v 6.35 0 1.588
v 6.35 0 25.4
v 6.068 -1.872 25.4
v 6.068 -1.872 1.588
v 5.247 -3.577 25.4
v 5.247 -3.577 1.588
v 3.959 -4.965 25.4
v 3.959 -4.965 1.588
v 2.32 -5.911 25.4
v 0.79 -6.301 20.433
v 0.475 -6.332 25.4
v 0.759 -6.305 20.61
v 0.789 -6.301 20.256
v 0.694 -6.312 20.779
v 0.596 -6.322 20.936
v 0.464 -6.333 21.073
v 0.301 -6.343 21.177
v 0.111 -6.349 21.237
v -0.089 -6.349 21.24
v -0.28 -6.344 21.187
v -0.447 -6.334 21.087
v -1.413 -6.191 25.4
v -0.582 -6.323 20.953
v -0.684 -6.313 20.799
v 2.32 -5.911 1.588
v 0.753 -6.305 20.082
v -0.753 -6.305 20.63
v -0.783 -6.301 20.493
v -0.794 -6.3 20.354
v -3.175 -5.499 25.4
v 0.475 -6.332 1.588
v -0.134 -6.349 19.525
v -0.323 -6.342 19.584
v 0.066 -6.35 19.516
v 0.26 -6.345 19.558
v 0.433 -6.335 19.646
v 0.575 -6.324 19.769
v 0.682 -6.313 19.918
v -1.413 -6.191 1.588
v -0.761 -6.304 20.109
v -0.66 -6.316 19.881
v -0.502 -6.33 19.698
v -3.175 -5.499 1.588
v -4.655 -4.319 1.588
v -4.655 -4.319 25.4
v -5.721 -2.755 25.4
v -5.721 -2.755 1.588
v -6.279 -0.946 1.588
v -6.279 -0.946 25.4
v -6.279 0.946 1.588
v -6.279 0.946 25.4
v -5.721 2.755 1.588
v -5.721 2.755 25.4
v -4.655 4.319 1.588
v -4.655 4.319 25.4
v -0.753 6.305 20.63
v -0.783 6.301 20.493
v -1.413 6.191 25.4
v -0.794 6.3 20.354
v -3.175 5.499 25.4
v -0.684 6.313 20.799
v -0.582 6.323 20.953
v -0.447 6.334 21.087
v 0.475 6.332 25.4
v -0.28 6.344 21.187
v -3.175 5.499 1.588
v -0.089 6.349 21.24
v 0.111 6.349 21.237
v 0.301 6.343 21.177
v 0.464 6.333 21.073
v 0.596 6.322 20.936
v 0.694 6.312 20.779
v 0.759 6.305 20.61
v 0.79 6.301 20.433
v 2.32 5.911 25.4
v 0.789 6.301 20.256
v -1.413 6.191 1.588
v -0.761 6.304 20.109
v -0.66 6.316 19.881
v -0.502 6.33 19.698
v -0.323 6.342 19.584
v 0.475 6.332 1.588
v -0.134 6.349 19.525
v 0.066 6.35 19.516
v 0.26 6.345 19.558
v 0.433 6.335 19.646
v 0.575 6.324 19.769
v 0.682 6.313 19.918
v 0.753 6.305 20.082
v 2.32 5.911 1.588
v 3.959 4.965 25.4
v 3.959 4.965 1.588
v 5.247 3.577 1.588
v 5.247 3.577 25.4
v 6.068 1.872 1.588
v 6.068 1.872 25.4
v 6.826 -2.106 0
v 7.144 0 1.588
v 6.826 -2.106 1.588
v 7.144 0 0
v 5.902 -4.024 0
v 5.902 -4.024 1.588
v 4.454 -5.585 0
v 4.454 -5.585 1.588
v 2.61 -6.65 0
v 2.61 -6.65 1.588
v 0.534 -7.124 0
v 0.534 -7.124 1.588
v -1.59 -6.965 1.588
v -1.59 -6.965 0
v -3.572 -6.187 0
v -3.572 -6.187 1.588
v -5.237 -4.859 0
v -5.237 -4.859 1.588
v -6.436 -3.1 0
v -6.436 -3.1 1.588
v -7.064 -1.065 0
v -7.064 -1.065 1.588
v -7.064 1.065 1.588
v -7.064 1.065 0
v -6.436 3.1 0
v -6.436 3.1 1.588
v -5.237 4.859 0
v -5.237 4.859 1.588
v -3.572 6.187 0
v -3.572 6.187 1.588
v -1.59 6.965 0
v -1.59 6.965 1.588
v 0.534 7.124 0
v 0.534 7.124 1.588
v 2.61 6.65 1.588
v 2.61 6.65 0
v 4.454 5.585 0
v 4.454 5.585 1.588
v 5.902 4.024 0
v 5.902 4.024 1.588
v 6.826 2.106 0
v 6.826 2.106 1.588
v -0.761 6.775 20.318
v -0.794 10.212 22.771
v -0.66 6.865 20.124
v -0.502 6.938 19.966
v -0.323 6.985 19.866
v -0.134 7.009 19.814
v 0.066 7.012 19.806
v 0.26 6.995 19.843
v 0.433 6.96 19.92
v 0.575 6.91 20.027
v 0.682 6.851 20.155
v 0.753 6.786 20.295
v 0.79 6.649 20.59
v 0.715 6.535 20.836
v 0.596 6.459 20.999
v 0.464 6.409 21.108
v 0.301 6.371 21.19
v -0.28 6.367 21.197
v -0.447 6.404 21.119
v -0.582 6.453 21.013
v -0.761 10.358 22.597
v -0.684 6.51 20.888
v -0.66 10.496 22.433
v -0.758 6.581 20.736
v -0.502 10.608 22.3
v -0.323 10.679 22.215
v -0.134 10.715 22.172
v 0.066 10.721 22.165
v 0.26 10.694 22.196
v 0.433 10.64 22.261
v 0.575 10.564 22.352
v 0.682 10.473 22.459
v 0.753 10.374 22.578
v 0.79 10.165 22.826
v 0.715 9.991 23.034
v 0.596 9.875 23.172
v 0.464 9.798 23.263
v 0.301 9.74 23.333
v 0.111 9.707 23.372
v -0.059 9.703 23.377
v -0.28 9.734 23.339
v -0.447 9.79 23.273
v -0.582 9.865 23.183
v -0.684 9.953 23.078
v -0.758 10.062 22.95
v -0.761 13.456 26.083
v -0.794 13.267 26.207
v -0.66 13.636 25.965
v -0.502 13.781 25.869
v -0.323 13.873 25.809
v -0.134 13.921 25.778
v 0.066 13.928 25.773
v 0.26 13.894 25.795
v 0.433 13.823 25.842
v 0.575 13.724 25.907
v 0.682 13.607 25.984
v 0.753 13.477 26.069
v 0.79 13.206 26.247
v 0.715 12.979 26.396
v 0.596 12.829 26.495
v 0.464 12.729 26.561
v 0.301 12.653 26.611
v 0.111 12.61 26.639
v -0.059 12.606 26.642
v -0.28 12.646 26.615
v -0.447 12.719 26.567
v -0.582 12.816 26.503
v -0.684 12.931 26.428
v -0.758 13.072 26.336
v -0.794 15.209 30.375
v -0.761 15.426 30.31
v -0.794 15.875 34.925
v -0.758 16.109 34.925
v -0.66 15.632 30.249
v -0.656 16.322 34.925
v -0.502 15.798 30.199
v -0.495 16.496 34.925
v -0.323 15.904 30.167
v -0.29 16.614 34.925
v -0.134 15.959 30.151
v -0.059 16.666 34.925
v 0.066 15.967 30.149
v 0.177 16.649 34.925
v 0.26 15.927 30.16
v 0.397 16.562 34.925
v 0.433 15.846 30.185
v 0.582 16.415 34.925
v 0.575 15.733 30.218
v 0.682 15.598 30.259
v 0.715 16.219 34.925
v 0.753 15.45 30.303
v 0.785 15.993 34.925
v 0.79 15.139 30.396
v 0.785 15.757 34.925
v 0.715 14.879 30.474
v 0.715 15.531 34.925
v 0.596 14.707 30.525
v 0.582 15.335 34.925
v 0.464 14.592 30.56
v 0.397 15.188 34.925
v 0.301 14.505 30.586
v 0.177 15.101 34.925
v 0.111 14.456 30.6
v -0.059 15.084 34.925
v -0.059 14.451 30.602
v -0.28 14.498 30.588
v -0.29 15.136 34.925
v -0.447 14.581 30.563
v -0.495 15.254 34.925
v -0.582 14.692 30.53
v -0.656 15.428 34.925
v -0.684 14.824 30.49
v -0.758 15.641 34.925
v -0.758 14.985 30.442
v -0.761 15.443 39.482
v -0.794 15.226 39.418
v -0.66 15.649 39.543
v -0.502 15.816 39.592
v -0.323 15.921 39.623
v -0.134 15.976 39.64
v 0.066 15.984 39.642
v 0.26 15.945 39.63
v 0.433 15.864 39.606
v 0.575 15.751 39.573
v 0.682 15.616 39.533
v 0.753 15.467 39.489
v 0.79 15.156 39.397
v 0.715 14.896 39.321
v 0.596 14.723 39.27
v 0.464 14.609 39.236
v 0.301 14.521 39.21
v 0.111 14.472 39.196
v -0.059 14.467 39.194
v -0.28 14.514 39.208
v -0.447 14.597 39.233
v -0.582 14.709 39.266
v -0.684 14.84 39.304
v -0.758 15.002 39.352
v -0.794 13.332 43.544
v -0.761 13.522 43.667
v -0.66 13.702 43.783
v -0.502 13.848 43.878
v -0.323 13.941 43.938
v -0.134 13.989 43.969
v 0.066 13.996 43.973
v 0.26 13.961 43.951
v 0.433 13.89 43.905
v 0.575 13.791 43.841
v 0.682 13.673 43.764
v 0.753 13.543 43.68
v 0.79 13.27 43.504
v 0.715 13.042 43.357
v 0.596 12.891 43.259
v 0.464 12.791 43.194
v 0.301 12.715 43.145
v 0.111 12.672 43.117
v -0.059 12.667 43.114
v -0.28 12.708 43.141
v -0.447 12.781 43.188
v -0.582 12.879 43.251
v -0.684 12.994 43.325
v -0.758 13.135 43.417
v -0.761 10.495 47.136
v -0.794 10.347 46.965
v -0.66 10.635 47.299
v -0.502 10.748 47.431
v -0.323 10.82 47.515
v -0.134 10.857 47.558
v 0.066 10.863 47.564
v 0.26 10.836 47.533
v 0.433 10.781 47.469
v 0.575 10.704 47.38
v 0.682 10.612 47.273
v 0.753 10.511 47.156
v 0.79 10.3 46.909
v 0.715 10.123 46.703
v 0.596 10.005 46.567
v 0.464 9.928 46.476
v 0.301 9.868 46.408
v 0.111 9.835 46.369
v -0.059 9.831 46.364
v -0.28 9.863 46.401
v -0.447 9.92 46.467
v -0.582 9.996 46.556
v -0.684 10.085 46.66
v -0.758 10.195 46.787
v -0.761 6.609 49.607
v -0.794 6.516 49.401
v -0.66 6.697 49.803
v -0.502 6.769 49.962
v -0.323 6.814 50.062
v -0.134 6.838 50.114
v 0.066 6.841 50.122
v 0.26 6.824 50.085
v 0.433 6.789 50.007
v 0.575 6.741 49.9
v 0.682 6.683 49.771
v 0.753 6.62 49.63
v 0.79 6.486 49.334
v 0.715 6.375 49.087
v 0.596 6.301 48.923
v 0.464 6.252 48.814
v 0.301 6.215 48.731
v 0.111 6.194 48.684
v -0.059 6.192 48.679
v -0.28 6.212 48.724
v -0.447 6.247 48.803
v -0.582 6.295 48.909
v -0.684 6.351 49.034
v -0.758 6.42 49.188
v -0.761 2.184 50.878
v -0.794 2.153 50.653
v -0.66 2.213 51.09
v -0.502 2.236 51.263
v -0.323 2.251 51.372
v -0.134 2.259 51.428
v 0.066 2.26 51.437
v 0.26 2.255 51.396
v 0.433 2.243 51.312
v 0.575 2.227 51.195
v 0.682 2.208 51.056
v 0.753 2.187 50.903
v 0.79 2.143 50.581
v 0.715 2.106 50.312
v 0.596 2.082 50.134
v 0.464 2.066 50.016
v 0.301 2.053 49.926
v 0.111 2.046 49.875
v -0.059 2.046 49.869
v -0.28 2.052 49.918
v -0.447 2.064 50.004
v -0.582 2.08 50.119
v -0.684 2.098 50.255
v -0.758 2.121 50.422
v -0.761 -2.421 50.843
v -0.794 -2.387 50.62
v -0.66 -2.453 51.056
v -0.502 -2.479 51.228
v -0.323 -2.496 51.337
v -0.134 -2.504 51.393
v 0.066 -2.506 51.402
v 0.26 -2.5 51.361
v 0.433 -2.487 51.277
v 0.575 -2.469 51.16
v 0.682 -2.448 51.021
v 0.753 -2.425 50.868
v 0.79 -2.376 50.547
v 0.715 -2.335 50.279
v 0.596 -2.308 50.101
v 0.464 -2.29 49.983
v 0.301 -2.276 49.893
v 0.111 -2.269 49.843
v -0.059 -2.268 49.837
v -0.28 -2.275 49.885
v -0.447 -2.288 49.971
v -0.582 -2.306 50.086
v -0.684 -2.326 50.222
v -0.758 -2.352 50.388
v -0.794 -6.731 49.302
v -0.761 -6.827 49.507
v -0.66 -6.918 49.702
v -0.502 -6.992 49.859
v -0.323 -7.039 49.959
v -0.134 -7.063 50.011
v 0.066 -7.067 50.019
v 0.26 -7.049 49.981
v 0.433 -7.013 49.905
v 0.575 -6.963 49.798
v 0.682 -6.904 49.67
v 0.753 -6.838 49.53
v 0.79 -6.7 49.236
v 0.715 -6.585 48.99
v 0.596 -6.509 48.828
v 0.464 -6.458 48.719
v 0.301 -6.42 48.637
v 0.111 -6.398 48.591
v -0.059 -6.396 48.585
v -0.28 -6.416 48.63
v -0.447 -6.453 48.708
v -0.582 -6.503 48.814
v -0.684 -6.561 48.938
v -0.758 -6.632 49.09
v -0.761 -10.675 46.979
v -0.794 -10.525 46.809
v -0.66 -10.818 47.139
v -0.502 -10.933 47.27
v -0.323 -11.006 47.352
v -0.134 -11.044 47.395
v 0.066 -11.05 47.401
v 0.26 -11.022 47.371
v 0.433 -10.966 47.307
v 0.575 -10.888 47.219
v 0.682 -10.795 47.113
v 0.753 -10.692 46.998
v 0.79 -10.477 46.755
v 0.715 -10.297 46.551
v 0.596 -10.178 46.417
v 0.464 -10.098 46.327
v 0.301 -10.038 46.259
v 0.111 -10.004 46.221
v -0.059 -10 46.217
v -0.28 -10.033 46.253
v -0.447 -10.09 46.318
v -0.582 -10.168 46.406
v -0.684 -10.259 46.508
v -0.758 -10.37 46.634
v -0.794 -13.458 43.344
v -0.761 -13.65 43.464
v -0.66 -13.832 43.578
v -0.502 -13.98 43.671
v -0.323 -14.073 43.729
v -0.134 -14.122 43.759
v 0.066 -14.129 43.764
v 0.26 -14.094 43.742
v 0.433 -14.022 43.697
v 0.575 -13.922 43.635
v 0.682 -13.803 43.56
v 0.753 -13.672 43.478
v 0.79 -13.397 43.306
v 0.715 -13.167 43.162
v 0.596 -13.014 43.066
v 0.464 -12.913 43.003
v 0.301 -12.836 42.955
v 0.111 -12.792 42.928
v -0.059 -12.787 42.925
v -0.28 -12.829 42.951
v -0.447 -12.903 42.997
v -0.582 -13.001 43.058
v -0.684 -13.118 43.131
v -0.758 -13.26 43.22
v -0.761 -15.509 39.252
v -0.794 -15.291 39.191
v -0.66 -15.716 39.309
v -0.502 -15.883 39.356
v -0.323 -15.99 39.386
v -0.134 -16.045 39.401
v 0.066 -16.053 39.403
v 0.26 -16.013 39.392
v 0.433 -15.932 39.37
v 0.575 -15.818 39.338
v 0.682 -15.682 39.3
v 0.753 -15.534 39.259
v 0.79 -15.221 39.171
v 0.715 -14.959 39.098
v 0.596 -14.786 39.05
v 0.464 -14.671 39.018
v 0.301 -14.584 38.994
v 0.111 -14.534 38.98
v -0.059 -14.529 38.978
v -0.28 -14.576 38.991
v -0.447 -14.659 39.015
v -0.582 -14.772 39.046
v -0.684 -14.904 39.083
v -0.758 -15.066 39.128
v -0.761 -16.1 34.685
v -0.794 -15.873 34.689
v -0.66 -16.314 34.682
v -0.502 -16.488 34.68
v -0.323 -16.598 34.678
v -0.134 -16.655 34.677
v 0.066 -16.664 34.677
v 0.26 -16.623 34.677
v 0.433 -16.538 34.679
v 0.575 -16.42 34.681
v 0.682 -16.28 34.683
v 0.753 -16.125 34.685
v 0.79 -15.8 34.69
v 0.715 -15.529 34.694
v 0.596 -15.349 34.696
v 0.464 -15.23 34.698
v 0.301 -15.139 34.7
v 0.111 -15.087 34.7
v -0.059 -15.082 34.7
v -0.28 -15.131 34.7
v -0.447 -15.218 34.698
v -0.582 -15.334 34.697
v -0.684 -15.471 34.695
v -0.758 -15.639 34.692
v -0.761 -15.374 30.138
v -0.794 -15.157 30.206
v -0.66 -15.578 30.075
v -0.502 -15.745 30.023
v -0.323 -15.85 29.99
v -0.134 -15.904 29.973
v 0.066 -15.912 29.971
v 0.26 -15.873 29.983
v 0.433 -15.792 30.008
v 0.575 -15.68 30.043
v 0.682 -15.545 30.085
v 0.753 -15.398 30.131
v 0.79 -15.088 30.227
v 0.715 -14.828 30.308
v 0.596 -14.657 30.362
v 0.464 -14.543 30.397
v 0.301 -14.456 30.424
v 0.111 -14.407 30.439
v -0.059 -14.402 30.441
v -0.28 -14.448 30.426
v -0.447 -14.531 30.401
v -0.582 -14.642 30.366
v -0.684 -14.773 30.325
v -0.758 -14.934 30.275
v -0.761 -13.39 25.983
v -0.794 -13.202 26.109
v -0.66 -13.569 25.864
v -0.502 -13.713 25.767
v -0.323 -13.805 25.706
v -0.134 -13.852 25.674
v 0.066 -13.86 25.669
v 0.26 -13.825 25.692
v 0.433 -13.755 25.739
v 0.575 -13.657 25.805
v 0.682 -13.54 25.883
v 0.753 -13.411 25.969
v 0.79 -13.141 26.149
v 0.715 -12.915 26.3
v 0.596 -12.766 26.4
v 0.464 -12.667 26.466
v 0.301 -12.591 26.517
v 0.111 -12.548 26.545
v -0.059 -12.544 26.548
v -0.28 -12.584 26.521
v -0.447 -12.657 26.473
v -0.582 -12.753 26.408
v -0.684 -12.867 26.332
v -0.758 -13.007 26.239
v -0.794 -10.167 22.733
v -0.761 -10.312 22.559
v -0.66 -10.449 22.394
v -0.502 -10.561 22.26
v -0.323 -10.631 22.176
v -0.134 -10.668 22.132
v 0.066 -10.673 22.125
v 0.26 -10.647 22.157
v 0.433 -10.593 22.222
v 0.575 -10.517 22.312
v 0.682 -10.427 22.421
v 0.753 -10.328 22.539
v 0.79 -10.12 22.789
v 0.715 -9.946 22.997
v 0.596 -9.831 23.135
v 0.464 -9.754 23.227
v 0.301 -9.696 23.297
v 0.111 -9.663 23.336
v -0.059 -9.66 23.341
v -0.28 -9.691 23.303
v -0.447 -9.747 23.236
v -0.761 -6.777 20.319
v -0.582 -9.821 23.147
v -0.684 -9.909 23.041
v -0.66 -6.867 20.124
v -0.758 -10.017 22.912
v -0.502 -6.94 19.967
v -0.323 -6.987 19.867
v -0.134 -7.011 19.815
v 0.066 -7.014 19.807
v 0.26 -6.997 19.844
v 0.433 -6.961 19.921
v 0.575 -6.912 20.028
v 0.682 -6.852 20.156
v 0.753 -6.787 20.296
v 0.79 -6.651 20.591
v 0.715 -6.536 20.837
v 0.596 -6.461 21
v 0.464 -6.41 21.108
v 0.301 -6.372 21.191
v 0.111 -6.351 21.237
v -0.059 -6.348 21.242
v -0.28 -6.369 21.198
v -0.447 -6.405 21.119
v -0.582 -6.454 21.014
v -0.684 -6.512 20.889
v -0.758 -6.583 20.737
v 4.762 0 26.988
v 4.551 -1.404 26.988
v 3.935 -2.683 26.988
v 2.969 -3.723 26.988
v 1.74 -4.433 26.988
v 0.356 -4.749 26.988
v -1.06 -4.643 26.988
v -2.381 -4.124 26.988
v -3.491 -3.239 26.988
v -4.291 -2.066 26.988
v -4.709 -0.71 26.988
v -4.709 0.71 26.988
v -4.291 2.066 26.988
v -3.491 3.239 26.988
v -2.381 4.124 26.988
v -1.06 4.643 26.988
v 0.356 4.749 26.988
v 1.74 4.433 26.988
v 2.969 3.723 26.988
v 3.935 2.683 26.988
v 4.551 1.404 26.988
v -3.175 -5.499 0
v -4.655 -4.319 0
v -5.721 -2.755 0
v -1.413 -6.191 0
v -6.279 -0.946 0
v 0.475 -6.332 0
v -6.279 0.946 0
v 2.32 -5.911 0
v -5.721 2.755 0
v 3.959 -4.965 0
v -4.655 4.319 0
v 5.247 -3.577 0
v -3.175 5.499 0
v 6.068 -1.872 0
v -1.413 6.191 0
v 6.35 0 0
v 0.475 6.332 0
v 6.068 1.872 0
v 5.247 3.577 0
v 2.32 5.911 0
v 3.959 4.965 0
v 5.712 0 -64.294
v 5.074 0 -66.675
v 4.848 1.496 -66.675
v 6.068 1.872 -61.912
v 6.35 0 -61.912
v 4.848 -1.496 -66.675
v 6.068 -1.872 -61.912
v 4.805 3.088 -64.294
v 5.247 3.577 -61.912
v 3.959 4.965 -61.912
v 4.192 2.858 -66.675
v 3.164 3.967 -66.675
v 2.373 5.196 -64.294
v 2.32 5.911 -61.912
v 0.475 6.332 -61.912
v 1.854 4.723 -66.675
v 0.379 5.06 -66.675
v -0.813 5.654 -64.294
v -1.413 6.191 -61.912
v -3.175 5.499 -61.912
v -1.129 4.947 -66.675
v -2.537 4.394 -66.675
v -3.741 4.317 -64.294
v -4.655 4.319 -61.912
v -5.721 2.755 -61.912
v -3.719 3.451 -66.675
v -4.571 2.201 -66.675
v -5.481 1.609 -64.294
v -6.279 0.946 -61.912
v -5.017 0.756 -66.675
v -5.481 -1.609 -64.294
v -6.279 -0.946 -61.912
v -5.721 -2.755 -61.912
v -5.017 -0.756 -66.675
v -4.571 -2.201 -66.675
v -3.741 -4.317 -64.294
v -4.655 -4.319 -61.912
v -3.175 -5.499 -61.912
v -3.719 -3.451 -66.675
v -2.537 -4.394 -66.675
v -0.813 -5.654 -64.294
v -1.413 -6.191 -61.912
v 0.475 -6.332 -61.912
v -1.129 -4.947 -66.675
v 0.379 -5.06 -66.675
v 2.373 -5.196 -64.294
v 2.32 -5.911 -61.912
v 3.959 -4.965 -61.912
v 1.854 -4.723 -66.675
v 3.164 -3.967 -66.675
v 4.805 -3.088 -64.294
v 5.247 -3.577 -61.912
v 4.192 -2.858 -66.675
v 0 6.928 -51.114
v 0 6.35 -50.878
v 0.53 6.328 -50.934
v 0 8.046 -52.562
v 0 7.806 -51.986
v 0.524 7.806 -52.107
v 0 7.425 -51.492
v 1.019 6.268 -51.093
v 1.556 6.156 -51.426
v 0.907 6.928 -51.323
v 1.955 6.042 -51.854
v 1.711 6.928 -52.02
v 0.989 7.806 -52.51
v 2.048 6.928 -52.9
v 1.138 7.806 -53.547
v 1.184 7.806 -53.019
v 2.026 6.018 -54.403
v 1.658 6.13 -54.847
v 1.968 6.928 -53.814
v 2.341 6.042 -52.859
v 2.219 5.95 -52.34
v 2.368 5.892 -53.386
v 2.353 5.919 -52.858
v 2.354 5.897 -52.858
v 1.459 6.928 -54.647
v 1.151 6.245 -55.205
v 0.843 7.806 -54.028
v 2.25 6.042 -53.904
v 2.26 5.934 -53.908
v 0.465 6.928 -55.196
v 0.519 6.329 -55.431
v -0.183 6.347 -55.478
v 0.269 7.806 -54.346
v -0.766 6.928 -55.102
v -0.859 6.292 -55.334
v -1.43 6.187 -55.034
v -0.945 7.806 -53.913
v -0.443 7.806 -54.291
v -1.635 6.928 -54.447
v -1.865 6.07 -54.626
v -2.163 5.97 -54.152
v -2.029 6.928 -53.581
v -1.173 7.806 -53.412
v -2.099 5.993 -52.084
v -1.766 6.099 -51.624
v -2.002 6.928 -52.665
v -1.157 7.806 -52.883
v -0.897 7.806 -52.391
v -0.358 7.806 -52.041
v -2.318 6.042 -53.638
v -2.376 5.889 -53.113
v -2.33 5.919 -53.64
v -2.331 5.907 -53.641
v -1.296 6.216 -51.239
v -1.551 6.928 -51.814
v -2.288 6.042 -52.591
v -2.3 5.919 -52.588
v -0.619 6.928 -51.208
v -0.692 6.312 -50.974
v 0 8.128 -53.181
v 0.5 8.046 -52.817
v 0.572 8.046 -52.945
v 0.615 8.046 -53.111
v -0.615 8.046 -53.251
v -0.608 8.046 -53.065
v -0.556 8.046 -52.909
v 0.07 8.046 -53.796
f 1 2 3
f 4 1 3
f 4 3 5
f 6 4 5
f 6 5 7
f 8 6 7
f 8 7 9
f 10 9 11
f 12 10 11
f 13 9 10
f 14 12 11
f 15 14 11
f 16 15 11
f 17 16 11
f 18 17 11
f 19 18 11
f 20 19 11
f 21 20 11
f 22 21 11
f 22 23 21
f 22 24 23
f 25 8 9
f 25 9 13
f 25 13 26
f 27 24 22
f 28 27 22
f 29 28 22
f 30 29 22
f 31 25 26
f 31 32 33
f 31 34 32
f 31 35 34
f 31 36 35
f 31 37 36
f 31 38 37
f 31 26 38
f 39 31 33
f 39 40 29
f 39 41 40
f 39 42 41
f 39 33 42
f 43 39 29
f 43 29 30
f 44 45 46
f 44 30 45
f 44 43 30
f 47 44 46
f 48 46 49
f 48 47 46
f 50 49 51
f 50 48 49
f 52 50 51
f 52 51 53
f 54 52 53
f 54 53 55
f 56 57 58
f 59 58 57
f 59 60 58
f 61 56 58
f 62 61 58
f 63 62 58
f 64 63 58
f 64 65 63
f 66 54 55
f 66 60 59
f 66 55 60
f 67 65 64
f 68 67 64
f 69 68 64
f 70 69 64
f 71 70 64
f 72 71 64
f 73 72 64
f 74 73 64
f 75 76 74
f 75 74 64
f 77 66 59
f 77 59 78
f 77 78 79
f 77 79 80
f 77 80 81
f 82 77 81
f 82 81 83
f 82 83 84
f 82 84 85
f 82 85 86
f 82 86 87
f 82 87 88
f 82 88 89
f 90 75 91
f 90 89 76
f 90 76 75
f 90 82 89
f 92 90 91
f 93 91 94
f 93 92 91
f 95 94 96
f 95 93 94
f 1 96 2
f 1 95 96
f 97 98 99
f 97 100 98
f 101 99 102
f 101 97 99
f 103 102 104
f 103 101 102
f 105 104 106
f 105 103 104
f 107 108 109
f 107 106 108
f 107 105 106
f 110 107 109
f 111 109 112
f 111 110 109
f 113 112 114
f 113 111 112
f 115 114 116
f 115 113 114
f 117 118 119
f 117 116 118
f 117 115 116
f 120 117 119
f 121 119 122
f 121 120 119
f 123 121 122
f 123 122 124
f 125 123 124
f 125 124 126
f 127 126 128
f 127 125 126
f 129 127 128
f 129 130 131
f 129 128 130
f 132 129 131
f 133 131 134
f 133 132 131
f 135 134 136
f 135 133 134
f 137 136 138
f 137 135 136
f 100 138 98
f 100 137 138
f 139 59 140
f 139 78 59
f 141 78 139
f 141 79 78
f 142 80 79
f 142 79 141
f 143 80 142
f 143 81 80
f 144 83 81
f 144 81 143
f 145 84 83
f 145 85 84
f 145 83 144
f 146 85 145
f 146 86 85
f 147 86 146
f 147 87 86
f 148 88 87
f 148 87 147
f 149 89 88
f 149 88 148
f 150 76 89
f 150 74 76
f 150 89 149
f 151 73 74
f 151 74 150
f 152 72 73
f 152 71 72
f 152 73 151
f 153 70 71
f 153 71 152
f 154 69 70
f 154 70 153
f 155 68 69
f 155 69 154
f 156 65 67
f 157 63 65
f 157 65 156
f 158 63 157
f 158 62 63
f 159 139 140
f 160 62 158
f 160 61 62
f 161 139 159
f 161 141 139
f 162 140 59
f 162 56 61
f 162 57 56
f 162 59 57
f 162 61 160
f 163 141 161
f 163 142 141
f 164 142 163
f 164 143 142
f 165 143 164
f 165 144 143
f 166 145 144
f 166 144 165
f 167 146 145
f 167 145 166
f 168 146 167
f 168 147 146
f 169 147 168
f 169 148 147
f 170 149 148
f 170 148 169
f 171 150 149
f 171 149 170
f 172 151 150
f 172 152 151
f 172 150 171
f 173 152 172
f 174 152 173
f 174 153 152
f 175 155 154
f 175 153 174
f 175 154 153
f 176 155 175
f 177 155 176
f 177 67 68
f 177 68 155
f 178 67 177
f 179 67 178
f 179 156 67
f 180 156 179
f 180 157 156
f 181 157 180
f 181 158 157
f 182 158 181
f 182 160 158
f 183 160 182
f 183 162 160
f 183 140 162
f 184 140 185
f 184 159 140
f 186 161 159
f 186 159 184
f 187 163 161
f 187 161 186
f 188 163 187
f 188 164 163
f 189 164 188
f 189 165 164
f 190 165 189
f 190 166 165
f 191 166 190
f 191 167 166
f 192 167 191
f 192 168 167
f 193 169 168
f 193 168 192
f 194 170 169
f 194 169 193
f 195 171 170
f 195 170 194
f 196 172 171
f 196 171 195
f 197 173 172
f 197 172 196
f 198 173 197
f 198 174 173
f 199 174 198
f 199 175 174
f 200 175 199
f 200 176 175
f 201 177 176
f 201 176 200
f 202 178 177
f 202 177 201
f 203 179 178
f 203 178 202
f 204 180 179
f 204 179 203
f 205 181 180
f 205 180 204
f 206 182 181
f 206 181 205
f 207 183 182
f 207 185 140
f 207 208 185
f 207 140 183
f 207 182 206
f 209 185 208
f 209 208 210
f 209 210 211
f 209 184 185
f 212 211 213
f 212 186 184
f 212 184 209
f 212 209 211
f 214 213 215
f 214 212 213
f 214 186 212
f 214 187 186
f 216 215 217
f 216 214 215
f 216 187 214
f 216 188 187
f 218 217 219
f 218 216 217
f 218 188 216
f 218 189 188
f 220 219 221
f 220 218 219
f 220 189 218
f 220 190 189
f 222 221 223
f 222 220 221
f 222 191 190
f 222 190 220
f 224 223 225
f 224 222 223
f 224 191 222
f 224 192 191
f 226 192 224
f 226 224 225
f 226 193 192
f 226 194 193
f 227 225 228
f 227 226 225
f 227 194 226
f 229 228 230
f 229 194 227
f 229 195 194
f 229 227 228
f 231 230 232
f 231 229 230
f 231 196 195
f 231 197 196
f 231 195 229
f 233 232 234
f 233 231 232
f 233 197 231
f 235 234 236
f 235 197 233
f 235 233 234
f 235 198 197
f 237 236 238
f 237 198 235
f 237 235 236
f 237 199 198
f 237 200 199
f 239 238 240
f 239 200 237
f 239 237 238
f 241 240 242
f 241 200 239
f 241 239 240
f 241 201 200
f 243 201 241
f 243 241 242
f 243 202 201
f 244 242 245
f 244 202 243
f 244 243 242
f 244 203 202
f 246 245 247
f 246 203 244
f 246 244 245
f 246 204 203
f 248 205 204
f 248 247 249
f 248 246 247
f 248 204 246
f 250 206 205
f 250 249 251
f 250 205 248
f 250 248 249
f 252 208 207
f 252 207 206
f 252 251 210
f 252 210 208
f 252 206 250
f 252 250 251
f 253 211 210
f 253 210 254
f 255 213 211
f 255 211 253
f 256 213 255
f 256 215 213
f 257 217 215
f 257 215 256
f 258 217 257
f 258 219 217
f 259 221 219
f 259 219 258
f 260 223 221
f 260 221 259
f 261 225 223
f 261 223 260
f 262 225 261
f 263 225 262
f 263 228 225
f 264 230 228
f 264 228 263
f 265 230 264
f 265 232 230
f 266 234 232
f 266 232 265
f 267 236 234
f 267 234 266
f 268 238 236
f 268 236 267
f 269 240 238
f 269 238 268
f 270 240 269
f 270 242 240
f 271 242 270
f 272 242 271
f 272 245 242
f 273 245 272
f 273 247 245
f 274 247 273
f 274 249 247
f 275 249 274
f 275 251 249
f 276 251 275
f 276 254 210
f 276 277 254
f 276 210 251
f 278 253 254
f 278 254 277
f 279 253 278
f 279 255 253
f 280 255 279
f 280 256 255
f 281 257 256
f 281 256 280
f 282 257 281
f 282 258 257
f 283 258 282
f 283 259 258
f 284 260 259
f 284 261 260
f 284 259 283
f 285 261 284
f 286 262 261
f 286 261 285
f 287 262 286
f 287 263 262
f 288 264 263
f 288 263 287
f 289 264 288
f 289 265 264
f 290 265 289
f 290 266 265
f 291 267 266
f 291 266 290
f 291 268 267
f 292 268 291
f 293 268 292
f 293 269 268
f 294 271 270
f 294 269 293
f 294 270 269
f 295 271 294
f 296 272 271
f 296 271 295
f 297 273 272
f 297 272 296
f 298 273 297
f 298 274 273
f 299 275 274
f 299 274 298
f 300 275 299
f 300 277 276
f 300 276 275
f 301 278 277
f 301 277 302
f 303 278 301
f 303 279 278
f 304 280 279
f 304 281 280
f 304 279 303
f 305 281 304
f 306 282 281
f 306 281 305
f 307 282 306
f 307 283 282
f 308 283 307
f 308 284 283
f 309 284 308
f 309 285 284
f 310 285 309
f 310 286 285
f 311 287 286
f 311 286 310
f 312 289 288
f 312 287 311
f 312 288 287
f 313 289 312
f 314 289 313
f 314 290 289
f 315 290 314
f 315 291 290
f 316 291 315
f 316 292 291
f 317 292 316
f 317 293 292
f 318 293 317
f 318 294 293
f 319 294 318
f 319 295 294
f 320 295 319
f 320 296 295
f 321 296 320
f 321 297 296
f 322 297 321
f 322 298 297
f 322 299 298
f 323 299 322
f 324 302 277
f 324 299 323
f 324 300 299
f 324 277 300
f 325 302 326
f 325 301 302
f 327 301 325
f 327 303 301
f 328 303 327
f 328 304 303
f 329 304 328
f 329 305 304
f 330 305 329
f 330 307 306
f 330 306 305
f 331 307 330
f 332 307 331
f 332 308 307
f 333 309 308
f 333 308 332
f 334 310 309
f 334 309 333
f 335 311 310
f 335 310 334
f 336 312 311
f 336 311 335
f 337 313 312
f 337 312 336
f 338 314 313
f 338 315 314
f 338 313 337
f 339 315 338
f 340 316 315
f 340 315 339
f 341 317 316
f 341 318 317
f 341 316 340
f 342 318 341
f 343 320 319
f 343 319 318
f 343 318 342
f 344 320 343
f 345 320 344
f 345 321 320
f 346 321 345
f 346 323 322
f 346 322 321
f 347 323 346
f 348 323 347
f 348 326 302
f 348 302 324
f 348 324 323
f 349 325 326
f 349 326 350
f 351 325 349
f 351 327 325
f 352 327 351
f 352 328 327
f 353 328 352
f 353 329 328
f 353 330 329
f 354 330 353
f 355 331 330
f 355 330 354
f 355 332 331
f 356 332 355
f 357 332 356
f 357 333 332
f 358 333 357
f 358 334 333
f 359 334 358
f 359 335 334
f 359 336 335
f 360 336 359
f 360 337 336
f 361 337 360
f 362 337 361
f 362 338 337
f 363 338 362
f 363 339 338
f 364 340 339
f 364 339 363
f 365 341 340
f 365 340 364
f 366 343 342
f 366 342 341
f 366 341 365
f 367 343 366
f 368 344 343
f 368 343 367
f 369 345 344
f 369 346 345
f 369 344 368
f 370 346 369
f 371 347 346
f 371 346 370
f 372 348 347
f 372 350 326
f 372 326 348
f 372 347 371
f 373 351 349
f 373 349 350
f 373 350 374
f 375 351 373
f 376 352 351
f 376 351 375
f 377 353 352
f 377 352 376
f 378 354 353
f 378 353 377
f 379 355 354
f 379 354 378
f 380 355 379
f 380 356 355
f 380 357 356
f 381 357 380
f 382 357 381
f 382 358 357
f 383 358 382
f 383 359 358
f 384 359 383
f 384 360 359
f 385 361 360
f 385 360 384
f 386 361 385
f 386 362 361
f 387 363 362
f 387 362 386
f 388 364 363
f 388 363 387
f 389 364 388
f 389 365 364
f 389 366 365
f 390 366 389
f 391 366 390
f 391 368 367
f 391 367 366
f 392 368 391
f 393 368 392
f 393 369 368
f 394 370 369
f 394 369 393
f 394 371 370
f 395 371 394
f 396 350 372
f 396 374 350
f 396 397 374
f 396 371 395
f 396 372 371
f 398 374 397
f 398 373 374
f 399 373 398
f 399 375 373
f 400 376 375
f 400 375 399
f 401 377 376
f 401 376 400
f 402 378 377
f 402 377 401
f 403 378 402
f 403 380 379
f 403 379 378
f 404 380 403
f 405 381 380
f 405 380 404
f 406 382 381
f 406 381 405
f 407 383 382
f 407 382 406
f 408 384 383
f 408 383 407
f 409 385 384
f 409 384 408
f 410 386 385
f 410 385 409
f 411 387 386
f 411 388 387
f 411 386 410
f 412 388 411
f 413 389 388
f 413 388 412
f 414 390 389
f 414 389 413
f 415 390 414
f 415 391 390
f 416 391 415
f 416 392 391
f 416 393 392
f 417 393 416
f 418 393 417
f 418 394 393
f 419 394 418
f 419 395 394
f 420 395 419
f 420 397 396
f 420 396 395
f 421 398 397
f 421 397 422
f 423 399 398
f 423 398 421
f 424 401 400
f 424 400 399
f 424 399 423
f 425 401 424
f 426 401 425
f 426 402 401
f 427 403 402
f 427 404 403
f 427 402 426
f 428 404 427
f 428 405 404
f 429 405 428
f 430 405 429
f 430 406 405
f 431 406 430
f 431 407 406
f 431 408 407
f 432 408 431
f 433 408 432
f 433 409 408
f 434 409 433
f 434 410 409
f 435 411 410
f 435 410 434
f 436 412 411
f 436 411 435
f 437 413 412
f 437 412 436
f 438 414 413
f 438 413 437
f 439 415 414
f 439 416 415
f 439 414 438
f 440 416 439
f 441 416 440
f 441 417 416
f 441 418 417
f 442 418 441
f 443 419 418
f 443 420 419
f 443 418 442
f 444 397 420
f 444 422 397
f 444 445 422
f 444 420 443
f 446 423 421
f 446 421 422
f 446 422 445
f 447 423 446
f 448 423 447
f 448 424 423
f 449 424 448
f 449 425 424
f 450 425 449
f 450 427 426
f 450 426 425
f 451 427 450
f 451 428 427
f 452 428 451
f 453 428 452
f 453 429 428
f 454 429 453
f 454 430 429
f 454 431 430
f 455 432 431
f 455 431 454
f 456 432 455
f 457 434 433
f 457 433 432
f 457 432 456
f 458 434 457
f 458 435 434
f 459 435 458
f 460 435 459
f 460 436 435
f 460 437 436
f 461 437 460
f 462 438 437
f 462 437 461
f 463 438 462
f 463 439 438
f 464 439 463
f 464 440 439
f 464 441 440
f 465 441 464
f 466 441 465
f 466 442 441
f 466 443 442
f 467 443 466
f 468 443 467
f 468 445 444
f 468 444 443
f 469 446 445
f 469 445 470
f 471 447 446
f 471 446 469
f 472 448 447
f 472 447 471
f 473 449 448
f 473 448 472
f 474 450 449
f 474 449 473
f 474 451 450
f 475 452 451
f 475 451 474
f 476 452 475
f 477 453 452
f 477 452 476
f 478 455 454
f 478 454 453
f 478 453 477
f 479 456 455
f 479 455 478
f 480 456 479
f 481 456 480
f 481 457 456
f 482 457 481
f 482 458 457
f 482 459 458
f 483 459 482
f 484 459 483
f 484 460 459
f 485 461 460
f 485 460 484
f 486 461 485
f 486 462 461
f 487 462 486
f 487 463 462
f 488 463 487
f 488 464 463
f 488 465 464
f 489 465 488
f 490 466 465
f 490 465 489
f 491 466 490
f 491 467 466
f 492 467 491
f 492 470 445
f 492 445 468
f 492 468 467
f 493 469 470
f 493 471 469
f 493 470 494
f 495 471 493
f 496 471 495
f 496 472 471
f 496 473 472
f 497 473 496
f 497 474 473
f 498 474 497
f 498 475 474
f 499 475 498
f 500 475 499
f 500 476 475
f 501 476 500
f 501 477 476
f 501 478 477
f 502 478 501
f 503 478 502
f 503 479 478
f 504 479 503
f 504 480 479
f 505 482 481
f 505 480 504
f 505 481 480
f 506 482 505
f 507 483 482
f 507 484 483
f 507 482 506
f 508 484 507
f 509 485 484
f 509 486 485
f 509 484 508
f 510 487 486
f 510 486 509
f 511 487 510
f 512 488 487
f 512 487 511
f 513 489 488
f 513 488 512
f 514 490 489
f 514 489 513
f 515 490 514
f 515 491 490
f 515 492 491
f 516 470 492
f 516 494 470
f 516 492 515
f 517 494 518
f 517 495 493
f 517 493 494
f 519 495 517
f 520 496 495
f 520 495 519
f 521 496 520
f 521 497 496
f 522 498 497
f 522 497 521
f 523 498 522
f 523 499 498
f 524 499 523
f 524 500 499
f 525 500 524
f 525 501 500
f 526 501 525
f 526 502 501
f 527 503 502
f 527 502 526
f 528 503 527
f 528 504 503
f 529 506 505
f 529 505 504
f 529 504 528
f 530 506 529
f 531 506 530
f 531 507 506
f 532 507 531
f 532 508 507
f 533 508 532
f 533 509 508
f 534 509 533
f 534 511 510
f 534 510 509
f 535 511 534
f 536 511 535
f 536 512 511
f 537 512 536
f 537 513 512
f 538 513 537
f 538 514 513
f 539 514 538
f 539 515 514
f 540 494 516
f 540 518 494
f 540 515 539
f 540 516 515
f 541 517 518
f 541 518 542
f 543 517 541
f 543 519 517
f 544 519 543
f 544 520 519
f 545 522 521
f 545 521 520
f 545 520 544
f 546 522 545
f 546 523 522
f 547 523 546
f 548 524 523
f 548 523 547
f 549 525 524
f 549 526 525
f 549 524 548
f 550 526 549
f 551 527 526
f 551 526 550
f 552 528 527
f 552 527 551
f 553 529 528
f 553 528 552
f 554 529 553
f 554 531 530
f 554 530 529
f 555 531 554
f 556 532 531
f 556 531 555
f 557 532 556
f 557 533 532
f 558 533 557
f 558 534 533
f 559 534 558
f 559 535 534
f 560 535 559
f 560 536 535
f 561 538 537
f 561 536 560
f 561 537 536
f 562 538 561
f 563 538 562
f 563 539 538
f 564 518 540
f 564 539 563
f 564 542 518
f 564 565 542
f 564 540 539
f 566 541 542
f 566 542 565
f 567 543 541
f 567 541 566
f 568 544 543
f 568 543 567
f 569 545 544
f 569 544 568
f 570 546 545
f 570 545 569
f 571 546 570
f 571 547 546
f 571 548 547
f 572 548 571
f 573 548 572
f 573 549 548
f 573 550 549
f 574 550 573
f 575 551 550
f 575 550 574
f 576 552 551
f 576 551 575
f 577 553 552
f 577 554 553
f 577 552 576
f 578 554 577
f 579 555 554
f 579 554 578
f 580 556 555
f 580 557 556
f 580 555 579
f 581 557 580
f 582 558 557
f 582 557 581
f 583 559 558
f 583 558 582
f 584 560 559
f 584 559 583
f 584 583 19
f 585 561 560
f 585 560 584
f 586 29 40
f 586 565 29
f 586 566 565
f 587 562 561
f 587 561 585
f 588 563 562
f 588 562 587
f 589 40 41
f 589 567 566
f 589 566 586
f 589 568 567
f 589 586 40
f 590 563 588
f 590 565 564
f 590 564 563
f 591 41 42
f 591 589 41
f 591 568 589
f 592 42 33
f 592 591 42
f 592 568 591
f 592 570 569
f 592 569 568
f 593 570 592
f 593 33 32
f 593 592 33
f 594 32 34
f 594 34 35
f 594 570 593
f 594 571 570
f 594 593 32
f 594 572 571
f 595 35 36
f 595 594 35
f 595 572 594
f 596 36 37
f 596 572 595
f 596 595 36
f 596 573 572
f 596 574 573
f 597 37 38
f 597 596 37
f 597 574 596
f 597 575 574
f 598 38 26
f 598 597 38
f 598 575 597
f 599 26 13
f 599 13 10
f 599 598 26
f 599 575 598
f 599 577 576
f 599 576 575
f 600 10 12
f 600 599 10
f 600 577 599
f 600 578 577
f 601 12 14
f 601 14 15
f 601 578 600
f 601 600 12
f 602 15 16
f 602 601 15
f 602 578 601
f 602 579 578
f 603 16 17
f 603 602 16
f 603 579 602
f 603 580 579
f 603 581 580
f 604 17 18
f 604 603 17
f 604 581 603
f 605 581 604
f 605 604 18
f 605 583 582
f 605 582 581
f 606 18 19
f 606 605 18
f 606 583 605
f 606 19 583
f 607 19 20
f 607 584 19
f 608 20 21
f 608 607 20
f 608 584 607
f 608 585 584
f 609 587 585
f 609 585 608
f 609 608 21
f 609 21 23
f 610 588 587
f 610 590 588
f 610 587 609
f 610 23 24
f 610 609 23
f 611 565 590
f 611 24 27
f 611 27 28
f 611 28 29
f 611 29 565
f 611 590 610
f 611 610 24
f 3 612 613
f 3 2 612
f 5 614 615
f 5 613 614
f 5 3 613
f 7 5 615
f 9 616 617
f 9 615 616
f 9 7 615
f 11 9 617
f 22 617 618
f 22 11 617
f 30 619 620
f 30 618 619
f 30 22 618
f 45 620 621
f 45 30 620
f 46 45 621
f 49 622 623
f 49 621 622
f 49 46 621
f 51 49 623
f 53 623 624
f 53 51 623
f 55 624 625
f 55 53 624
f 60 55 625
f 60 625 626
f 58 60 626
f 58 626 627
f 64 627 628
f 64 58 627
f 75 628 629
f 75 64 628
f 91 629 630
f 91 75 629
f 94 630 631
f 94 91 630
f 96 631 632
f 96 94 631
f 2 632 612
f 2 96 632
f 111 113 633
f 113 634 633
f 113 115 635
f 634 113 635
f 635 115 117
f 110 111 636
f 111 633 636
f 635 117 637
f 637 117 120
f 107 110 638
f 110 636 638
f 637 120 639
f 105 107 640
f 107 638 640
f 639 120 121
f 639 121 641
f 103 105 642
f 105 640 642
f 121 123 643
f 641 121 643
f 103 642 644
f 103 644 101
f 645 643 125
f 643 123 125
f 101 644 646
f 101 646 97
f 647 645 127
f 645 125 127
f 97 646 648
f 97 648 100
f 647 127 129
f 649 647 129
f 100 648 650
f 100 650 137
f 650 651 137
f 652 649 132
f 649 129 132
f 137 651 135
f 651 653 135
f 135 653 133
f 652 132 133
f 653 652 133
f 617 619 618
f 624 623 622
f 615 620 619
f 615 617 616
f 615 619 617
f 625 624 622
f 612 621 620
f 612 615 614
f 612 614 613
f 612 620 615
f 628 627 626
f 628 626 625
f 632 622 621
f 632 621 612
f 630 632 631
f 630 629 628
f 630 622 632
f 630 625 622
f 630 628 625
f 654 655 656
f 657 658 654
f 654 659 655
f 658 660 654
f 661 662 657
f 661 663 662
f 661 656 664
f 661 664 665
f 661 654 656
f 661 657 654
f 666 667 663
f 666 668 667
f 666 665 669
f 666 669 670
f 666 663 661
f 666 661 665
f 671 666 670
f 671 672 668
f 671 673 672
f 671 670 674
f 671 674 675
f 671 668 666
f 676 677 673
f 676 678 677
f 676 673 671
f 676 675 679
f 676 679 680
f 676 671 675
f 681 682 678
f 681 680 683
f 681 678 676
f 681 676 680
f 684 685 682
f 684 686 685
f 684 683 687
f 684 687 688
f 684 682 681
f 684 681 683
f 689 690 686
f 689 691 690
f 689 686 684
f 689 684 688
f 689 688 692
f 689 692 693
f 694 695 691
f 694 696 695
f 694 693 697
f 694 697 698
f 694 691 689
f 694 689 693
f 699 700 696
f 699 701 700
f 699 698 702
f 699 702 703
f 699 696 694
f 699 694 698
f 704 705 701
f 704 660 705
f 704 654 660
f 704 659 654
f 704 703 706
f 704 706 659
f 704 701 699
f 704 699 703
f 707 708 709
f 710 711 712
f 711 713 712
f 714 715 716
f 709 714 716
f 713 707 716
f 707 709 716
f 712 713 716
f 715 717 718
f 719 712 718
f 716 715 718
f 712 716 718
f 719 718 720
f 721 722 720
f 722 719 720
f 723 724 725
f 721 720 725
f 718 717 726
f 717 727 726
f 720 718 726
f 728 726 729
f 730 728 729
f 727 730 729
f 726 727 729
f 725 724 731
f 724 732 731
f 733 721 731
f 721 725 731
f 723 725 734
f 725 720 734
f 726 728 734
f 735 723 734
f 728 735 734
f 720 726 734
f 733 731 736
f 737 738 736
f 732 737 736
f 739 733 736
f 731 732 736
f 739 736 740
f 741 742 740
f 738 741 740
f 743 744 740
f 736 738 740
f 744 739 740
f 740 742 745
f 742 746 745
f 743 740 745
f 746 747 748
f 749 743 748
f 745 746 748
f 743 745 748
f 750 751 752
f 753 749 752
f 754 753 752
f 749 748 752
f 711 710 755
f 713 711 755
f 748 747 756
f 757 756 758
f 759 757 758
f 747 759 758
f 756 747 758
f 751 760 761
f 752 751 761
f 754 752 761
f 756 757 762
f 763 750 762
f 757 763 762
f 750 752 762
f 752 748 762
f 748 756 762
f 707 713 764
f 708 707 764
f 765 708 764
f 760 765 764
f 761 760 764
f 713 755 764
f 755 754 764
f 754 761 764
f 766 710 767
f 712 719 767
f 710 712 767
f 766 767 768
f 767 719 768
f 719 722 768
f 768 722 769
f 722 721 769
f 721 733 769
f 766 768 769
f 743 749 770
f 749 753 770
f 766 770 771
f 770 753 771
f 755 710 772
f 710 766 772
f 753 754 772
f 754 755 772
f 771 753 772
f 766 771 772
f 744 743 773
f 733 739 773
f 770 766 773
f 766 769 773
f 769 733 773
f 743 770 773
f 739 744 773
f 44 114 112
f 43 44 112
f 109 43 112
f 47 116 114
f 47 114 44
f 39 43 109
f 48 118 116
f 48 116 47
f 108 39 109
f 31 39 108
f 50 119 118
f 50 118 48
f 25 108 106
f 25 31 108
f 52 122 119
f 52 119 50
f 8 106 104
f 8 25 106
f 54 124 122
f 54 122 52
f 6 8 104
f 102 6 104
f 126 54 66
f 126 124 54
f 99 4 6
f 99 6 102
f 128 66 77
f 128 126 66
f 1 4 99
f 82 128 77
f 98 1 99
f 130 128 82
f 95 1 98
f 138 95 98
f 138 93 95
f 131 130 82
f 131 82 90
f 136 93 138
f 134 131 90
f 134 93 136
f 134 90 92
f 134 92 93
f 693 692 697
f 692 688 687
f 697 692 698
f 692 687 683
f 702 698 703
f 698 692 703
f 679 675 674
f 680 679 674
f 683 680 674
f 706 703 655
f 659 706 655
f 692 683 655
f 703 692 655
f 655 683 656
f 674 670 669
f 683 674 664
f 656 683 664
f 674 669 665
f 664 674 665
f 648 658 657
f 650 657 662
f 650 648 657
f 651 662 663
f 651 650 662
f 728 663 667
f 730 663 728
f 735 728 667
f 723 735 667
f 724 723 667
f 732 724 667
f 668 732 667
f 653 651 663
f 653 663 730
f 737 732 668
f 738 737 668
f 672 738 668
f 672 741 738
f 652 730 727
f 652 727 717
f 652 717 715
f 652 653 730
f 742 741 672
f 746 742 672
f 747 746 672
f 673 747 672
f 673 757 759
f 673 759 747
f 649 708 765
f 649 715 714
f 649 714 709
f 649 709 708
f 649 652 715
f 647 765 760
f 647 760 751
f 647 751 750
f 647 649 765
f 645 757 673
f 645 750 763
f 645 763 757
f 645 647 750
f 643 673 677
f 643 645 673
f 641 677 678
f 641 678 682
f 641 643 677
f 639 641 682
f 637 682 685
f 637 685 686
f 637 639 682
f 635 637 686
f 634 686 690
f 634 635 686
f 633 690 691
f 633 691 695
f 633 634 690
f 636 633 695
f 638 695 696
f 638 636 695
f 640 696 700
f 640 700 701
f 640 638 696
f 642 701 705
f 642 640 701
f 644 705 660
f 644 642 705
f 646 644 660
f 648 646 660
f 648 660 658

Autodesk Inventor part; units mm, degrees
ref_plane "YZ Plane" through (0, 0, 0) normal (1, 0, 0) x (0, 1, 0)
ref_plane "XZ Plane" through (0, 0, 0) normal (0, 1, 0) x (-1, 0, 0)
ref_plane "XY Plane" through (0, 0, 0) normal (0, 0, 1) x (1, 0, 0)
sketch "Sketch1" plane through (0, 0, 0) normal (0, 0, 1) x (1, 0, 0)
  circle A0 centre (0, 0) radius 6.35
  dimension "d0" = 12.7
extrude "Extrusion1" add sketch "Sketch1" along normal blind 26.9875 and the other way blind 66.675
sketch "Sketch2" plane through (0, 0, 0) normal (0, 0, 1) x (1, 0, 0)
  circle A0 centre (0, 0) radius 7.1437
  dimension "d5" = 14.2875
extrude "Extrusion2" add sketch "Sketch2" along normal blind 1.5875
chamfer "Chamfer1" distance 4.7625 angle 15 1 edges at (-6.35, 0, -66.675) measured on face at (6.3294, -0.511, -44.45)
chamfer "Chamfer2" distance 1.5875 angle 45 1 edges at (-6.35, 0, 26.9875)
sketch "Sketch3" plane through (0, 0, 0) normal (1, 0, 0) x (0, 1, 0)
  line L0 (0, -53.1813) -> (8.128, -53.1813)
  arc A0 (8.128, -53.1813) -> (5.7468, -50.8) centre (5.7468, -53.1813) ccw
  line L1 (5.7468, -50.8) -> (0, -50.8)
  line L2 (0, -50.8) -> (0, -53.1813)
  point P0 (0, 0)
  dimension "d14" = 4.7625
  dimension "d15" = 50.8
  dimension "d16" = 8.128
revolve "Revolution1" add sketch "Sketch3" angle 360 about axis through (0, 0, -53.1813) along (0, 1, 0)
sketch "Sketch4" plane through (0, 0, 0) normal (1, 0, 0) x (0, 1, 0)
  circle A0 centre (0, 34.925) radius 15.875
  point P0 (0, 0)
  dimension "d18" = 31.75
  dimension "d19" = 34.925
sketch "Sketch5" plane through (0, 0, 0) normal (0, 1, 0) x (-1, 0, 0)
  line L0 (0, 50.8) -> (0, 19.05) construction
  circle A0 centre (0, 50.8) radius 0.7937
  point P0 (0, 0)
  dimension "d20" = 1.5875
sweep "Sweep1" add profiles "Sketch5" path "Sketch4"
properties part number "Quick release pin" material "Stainless Steel"
